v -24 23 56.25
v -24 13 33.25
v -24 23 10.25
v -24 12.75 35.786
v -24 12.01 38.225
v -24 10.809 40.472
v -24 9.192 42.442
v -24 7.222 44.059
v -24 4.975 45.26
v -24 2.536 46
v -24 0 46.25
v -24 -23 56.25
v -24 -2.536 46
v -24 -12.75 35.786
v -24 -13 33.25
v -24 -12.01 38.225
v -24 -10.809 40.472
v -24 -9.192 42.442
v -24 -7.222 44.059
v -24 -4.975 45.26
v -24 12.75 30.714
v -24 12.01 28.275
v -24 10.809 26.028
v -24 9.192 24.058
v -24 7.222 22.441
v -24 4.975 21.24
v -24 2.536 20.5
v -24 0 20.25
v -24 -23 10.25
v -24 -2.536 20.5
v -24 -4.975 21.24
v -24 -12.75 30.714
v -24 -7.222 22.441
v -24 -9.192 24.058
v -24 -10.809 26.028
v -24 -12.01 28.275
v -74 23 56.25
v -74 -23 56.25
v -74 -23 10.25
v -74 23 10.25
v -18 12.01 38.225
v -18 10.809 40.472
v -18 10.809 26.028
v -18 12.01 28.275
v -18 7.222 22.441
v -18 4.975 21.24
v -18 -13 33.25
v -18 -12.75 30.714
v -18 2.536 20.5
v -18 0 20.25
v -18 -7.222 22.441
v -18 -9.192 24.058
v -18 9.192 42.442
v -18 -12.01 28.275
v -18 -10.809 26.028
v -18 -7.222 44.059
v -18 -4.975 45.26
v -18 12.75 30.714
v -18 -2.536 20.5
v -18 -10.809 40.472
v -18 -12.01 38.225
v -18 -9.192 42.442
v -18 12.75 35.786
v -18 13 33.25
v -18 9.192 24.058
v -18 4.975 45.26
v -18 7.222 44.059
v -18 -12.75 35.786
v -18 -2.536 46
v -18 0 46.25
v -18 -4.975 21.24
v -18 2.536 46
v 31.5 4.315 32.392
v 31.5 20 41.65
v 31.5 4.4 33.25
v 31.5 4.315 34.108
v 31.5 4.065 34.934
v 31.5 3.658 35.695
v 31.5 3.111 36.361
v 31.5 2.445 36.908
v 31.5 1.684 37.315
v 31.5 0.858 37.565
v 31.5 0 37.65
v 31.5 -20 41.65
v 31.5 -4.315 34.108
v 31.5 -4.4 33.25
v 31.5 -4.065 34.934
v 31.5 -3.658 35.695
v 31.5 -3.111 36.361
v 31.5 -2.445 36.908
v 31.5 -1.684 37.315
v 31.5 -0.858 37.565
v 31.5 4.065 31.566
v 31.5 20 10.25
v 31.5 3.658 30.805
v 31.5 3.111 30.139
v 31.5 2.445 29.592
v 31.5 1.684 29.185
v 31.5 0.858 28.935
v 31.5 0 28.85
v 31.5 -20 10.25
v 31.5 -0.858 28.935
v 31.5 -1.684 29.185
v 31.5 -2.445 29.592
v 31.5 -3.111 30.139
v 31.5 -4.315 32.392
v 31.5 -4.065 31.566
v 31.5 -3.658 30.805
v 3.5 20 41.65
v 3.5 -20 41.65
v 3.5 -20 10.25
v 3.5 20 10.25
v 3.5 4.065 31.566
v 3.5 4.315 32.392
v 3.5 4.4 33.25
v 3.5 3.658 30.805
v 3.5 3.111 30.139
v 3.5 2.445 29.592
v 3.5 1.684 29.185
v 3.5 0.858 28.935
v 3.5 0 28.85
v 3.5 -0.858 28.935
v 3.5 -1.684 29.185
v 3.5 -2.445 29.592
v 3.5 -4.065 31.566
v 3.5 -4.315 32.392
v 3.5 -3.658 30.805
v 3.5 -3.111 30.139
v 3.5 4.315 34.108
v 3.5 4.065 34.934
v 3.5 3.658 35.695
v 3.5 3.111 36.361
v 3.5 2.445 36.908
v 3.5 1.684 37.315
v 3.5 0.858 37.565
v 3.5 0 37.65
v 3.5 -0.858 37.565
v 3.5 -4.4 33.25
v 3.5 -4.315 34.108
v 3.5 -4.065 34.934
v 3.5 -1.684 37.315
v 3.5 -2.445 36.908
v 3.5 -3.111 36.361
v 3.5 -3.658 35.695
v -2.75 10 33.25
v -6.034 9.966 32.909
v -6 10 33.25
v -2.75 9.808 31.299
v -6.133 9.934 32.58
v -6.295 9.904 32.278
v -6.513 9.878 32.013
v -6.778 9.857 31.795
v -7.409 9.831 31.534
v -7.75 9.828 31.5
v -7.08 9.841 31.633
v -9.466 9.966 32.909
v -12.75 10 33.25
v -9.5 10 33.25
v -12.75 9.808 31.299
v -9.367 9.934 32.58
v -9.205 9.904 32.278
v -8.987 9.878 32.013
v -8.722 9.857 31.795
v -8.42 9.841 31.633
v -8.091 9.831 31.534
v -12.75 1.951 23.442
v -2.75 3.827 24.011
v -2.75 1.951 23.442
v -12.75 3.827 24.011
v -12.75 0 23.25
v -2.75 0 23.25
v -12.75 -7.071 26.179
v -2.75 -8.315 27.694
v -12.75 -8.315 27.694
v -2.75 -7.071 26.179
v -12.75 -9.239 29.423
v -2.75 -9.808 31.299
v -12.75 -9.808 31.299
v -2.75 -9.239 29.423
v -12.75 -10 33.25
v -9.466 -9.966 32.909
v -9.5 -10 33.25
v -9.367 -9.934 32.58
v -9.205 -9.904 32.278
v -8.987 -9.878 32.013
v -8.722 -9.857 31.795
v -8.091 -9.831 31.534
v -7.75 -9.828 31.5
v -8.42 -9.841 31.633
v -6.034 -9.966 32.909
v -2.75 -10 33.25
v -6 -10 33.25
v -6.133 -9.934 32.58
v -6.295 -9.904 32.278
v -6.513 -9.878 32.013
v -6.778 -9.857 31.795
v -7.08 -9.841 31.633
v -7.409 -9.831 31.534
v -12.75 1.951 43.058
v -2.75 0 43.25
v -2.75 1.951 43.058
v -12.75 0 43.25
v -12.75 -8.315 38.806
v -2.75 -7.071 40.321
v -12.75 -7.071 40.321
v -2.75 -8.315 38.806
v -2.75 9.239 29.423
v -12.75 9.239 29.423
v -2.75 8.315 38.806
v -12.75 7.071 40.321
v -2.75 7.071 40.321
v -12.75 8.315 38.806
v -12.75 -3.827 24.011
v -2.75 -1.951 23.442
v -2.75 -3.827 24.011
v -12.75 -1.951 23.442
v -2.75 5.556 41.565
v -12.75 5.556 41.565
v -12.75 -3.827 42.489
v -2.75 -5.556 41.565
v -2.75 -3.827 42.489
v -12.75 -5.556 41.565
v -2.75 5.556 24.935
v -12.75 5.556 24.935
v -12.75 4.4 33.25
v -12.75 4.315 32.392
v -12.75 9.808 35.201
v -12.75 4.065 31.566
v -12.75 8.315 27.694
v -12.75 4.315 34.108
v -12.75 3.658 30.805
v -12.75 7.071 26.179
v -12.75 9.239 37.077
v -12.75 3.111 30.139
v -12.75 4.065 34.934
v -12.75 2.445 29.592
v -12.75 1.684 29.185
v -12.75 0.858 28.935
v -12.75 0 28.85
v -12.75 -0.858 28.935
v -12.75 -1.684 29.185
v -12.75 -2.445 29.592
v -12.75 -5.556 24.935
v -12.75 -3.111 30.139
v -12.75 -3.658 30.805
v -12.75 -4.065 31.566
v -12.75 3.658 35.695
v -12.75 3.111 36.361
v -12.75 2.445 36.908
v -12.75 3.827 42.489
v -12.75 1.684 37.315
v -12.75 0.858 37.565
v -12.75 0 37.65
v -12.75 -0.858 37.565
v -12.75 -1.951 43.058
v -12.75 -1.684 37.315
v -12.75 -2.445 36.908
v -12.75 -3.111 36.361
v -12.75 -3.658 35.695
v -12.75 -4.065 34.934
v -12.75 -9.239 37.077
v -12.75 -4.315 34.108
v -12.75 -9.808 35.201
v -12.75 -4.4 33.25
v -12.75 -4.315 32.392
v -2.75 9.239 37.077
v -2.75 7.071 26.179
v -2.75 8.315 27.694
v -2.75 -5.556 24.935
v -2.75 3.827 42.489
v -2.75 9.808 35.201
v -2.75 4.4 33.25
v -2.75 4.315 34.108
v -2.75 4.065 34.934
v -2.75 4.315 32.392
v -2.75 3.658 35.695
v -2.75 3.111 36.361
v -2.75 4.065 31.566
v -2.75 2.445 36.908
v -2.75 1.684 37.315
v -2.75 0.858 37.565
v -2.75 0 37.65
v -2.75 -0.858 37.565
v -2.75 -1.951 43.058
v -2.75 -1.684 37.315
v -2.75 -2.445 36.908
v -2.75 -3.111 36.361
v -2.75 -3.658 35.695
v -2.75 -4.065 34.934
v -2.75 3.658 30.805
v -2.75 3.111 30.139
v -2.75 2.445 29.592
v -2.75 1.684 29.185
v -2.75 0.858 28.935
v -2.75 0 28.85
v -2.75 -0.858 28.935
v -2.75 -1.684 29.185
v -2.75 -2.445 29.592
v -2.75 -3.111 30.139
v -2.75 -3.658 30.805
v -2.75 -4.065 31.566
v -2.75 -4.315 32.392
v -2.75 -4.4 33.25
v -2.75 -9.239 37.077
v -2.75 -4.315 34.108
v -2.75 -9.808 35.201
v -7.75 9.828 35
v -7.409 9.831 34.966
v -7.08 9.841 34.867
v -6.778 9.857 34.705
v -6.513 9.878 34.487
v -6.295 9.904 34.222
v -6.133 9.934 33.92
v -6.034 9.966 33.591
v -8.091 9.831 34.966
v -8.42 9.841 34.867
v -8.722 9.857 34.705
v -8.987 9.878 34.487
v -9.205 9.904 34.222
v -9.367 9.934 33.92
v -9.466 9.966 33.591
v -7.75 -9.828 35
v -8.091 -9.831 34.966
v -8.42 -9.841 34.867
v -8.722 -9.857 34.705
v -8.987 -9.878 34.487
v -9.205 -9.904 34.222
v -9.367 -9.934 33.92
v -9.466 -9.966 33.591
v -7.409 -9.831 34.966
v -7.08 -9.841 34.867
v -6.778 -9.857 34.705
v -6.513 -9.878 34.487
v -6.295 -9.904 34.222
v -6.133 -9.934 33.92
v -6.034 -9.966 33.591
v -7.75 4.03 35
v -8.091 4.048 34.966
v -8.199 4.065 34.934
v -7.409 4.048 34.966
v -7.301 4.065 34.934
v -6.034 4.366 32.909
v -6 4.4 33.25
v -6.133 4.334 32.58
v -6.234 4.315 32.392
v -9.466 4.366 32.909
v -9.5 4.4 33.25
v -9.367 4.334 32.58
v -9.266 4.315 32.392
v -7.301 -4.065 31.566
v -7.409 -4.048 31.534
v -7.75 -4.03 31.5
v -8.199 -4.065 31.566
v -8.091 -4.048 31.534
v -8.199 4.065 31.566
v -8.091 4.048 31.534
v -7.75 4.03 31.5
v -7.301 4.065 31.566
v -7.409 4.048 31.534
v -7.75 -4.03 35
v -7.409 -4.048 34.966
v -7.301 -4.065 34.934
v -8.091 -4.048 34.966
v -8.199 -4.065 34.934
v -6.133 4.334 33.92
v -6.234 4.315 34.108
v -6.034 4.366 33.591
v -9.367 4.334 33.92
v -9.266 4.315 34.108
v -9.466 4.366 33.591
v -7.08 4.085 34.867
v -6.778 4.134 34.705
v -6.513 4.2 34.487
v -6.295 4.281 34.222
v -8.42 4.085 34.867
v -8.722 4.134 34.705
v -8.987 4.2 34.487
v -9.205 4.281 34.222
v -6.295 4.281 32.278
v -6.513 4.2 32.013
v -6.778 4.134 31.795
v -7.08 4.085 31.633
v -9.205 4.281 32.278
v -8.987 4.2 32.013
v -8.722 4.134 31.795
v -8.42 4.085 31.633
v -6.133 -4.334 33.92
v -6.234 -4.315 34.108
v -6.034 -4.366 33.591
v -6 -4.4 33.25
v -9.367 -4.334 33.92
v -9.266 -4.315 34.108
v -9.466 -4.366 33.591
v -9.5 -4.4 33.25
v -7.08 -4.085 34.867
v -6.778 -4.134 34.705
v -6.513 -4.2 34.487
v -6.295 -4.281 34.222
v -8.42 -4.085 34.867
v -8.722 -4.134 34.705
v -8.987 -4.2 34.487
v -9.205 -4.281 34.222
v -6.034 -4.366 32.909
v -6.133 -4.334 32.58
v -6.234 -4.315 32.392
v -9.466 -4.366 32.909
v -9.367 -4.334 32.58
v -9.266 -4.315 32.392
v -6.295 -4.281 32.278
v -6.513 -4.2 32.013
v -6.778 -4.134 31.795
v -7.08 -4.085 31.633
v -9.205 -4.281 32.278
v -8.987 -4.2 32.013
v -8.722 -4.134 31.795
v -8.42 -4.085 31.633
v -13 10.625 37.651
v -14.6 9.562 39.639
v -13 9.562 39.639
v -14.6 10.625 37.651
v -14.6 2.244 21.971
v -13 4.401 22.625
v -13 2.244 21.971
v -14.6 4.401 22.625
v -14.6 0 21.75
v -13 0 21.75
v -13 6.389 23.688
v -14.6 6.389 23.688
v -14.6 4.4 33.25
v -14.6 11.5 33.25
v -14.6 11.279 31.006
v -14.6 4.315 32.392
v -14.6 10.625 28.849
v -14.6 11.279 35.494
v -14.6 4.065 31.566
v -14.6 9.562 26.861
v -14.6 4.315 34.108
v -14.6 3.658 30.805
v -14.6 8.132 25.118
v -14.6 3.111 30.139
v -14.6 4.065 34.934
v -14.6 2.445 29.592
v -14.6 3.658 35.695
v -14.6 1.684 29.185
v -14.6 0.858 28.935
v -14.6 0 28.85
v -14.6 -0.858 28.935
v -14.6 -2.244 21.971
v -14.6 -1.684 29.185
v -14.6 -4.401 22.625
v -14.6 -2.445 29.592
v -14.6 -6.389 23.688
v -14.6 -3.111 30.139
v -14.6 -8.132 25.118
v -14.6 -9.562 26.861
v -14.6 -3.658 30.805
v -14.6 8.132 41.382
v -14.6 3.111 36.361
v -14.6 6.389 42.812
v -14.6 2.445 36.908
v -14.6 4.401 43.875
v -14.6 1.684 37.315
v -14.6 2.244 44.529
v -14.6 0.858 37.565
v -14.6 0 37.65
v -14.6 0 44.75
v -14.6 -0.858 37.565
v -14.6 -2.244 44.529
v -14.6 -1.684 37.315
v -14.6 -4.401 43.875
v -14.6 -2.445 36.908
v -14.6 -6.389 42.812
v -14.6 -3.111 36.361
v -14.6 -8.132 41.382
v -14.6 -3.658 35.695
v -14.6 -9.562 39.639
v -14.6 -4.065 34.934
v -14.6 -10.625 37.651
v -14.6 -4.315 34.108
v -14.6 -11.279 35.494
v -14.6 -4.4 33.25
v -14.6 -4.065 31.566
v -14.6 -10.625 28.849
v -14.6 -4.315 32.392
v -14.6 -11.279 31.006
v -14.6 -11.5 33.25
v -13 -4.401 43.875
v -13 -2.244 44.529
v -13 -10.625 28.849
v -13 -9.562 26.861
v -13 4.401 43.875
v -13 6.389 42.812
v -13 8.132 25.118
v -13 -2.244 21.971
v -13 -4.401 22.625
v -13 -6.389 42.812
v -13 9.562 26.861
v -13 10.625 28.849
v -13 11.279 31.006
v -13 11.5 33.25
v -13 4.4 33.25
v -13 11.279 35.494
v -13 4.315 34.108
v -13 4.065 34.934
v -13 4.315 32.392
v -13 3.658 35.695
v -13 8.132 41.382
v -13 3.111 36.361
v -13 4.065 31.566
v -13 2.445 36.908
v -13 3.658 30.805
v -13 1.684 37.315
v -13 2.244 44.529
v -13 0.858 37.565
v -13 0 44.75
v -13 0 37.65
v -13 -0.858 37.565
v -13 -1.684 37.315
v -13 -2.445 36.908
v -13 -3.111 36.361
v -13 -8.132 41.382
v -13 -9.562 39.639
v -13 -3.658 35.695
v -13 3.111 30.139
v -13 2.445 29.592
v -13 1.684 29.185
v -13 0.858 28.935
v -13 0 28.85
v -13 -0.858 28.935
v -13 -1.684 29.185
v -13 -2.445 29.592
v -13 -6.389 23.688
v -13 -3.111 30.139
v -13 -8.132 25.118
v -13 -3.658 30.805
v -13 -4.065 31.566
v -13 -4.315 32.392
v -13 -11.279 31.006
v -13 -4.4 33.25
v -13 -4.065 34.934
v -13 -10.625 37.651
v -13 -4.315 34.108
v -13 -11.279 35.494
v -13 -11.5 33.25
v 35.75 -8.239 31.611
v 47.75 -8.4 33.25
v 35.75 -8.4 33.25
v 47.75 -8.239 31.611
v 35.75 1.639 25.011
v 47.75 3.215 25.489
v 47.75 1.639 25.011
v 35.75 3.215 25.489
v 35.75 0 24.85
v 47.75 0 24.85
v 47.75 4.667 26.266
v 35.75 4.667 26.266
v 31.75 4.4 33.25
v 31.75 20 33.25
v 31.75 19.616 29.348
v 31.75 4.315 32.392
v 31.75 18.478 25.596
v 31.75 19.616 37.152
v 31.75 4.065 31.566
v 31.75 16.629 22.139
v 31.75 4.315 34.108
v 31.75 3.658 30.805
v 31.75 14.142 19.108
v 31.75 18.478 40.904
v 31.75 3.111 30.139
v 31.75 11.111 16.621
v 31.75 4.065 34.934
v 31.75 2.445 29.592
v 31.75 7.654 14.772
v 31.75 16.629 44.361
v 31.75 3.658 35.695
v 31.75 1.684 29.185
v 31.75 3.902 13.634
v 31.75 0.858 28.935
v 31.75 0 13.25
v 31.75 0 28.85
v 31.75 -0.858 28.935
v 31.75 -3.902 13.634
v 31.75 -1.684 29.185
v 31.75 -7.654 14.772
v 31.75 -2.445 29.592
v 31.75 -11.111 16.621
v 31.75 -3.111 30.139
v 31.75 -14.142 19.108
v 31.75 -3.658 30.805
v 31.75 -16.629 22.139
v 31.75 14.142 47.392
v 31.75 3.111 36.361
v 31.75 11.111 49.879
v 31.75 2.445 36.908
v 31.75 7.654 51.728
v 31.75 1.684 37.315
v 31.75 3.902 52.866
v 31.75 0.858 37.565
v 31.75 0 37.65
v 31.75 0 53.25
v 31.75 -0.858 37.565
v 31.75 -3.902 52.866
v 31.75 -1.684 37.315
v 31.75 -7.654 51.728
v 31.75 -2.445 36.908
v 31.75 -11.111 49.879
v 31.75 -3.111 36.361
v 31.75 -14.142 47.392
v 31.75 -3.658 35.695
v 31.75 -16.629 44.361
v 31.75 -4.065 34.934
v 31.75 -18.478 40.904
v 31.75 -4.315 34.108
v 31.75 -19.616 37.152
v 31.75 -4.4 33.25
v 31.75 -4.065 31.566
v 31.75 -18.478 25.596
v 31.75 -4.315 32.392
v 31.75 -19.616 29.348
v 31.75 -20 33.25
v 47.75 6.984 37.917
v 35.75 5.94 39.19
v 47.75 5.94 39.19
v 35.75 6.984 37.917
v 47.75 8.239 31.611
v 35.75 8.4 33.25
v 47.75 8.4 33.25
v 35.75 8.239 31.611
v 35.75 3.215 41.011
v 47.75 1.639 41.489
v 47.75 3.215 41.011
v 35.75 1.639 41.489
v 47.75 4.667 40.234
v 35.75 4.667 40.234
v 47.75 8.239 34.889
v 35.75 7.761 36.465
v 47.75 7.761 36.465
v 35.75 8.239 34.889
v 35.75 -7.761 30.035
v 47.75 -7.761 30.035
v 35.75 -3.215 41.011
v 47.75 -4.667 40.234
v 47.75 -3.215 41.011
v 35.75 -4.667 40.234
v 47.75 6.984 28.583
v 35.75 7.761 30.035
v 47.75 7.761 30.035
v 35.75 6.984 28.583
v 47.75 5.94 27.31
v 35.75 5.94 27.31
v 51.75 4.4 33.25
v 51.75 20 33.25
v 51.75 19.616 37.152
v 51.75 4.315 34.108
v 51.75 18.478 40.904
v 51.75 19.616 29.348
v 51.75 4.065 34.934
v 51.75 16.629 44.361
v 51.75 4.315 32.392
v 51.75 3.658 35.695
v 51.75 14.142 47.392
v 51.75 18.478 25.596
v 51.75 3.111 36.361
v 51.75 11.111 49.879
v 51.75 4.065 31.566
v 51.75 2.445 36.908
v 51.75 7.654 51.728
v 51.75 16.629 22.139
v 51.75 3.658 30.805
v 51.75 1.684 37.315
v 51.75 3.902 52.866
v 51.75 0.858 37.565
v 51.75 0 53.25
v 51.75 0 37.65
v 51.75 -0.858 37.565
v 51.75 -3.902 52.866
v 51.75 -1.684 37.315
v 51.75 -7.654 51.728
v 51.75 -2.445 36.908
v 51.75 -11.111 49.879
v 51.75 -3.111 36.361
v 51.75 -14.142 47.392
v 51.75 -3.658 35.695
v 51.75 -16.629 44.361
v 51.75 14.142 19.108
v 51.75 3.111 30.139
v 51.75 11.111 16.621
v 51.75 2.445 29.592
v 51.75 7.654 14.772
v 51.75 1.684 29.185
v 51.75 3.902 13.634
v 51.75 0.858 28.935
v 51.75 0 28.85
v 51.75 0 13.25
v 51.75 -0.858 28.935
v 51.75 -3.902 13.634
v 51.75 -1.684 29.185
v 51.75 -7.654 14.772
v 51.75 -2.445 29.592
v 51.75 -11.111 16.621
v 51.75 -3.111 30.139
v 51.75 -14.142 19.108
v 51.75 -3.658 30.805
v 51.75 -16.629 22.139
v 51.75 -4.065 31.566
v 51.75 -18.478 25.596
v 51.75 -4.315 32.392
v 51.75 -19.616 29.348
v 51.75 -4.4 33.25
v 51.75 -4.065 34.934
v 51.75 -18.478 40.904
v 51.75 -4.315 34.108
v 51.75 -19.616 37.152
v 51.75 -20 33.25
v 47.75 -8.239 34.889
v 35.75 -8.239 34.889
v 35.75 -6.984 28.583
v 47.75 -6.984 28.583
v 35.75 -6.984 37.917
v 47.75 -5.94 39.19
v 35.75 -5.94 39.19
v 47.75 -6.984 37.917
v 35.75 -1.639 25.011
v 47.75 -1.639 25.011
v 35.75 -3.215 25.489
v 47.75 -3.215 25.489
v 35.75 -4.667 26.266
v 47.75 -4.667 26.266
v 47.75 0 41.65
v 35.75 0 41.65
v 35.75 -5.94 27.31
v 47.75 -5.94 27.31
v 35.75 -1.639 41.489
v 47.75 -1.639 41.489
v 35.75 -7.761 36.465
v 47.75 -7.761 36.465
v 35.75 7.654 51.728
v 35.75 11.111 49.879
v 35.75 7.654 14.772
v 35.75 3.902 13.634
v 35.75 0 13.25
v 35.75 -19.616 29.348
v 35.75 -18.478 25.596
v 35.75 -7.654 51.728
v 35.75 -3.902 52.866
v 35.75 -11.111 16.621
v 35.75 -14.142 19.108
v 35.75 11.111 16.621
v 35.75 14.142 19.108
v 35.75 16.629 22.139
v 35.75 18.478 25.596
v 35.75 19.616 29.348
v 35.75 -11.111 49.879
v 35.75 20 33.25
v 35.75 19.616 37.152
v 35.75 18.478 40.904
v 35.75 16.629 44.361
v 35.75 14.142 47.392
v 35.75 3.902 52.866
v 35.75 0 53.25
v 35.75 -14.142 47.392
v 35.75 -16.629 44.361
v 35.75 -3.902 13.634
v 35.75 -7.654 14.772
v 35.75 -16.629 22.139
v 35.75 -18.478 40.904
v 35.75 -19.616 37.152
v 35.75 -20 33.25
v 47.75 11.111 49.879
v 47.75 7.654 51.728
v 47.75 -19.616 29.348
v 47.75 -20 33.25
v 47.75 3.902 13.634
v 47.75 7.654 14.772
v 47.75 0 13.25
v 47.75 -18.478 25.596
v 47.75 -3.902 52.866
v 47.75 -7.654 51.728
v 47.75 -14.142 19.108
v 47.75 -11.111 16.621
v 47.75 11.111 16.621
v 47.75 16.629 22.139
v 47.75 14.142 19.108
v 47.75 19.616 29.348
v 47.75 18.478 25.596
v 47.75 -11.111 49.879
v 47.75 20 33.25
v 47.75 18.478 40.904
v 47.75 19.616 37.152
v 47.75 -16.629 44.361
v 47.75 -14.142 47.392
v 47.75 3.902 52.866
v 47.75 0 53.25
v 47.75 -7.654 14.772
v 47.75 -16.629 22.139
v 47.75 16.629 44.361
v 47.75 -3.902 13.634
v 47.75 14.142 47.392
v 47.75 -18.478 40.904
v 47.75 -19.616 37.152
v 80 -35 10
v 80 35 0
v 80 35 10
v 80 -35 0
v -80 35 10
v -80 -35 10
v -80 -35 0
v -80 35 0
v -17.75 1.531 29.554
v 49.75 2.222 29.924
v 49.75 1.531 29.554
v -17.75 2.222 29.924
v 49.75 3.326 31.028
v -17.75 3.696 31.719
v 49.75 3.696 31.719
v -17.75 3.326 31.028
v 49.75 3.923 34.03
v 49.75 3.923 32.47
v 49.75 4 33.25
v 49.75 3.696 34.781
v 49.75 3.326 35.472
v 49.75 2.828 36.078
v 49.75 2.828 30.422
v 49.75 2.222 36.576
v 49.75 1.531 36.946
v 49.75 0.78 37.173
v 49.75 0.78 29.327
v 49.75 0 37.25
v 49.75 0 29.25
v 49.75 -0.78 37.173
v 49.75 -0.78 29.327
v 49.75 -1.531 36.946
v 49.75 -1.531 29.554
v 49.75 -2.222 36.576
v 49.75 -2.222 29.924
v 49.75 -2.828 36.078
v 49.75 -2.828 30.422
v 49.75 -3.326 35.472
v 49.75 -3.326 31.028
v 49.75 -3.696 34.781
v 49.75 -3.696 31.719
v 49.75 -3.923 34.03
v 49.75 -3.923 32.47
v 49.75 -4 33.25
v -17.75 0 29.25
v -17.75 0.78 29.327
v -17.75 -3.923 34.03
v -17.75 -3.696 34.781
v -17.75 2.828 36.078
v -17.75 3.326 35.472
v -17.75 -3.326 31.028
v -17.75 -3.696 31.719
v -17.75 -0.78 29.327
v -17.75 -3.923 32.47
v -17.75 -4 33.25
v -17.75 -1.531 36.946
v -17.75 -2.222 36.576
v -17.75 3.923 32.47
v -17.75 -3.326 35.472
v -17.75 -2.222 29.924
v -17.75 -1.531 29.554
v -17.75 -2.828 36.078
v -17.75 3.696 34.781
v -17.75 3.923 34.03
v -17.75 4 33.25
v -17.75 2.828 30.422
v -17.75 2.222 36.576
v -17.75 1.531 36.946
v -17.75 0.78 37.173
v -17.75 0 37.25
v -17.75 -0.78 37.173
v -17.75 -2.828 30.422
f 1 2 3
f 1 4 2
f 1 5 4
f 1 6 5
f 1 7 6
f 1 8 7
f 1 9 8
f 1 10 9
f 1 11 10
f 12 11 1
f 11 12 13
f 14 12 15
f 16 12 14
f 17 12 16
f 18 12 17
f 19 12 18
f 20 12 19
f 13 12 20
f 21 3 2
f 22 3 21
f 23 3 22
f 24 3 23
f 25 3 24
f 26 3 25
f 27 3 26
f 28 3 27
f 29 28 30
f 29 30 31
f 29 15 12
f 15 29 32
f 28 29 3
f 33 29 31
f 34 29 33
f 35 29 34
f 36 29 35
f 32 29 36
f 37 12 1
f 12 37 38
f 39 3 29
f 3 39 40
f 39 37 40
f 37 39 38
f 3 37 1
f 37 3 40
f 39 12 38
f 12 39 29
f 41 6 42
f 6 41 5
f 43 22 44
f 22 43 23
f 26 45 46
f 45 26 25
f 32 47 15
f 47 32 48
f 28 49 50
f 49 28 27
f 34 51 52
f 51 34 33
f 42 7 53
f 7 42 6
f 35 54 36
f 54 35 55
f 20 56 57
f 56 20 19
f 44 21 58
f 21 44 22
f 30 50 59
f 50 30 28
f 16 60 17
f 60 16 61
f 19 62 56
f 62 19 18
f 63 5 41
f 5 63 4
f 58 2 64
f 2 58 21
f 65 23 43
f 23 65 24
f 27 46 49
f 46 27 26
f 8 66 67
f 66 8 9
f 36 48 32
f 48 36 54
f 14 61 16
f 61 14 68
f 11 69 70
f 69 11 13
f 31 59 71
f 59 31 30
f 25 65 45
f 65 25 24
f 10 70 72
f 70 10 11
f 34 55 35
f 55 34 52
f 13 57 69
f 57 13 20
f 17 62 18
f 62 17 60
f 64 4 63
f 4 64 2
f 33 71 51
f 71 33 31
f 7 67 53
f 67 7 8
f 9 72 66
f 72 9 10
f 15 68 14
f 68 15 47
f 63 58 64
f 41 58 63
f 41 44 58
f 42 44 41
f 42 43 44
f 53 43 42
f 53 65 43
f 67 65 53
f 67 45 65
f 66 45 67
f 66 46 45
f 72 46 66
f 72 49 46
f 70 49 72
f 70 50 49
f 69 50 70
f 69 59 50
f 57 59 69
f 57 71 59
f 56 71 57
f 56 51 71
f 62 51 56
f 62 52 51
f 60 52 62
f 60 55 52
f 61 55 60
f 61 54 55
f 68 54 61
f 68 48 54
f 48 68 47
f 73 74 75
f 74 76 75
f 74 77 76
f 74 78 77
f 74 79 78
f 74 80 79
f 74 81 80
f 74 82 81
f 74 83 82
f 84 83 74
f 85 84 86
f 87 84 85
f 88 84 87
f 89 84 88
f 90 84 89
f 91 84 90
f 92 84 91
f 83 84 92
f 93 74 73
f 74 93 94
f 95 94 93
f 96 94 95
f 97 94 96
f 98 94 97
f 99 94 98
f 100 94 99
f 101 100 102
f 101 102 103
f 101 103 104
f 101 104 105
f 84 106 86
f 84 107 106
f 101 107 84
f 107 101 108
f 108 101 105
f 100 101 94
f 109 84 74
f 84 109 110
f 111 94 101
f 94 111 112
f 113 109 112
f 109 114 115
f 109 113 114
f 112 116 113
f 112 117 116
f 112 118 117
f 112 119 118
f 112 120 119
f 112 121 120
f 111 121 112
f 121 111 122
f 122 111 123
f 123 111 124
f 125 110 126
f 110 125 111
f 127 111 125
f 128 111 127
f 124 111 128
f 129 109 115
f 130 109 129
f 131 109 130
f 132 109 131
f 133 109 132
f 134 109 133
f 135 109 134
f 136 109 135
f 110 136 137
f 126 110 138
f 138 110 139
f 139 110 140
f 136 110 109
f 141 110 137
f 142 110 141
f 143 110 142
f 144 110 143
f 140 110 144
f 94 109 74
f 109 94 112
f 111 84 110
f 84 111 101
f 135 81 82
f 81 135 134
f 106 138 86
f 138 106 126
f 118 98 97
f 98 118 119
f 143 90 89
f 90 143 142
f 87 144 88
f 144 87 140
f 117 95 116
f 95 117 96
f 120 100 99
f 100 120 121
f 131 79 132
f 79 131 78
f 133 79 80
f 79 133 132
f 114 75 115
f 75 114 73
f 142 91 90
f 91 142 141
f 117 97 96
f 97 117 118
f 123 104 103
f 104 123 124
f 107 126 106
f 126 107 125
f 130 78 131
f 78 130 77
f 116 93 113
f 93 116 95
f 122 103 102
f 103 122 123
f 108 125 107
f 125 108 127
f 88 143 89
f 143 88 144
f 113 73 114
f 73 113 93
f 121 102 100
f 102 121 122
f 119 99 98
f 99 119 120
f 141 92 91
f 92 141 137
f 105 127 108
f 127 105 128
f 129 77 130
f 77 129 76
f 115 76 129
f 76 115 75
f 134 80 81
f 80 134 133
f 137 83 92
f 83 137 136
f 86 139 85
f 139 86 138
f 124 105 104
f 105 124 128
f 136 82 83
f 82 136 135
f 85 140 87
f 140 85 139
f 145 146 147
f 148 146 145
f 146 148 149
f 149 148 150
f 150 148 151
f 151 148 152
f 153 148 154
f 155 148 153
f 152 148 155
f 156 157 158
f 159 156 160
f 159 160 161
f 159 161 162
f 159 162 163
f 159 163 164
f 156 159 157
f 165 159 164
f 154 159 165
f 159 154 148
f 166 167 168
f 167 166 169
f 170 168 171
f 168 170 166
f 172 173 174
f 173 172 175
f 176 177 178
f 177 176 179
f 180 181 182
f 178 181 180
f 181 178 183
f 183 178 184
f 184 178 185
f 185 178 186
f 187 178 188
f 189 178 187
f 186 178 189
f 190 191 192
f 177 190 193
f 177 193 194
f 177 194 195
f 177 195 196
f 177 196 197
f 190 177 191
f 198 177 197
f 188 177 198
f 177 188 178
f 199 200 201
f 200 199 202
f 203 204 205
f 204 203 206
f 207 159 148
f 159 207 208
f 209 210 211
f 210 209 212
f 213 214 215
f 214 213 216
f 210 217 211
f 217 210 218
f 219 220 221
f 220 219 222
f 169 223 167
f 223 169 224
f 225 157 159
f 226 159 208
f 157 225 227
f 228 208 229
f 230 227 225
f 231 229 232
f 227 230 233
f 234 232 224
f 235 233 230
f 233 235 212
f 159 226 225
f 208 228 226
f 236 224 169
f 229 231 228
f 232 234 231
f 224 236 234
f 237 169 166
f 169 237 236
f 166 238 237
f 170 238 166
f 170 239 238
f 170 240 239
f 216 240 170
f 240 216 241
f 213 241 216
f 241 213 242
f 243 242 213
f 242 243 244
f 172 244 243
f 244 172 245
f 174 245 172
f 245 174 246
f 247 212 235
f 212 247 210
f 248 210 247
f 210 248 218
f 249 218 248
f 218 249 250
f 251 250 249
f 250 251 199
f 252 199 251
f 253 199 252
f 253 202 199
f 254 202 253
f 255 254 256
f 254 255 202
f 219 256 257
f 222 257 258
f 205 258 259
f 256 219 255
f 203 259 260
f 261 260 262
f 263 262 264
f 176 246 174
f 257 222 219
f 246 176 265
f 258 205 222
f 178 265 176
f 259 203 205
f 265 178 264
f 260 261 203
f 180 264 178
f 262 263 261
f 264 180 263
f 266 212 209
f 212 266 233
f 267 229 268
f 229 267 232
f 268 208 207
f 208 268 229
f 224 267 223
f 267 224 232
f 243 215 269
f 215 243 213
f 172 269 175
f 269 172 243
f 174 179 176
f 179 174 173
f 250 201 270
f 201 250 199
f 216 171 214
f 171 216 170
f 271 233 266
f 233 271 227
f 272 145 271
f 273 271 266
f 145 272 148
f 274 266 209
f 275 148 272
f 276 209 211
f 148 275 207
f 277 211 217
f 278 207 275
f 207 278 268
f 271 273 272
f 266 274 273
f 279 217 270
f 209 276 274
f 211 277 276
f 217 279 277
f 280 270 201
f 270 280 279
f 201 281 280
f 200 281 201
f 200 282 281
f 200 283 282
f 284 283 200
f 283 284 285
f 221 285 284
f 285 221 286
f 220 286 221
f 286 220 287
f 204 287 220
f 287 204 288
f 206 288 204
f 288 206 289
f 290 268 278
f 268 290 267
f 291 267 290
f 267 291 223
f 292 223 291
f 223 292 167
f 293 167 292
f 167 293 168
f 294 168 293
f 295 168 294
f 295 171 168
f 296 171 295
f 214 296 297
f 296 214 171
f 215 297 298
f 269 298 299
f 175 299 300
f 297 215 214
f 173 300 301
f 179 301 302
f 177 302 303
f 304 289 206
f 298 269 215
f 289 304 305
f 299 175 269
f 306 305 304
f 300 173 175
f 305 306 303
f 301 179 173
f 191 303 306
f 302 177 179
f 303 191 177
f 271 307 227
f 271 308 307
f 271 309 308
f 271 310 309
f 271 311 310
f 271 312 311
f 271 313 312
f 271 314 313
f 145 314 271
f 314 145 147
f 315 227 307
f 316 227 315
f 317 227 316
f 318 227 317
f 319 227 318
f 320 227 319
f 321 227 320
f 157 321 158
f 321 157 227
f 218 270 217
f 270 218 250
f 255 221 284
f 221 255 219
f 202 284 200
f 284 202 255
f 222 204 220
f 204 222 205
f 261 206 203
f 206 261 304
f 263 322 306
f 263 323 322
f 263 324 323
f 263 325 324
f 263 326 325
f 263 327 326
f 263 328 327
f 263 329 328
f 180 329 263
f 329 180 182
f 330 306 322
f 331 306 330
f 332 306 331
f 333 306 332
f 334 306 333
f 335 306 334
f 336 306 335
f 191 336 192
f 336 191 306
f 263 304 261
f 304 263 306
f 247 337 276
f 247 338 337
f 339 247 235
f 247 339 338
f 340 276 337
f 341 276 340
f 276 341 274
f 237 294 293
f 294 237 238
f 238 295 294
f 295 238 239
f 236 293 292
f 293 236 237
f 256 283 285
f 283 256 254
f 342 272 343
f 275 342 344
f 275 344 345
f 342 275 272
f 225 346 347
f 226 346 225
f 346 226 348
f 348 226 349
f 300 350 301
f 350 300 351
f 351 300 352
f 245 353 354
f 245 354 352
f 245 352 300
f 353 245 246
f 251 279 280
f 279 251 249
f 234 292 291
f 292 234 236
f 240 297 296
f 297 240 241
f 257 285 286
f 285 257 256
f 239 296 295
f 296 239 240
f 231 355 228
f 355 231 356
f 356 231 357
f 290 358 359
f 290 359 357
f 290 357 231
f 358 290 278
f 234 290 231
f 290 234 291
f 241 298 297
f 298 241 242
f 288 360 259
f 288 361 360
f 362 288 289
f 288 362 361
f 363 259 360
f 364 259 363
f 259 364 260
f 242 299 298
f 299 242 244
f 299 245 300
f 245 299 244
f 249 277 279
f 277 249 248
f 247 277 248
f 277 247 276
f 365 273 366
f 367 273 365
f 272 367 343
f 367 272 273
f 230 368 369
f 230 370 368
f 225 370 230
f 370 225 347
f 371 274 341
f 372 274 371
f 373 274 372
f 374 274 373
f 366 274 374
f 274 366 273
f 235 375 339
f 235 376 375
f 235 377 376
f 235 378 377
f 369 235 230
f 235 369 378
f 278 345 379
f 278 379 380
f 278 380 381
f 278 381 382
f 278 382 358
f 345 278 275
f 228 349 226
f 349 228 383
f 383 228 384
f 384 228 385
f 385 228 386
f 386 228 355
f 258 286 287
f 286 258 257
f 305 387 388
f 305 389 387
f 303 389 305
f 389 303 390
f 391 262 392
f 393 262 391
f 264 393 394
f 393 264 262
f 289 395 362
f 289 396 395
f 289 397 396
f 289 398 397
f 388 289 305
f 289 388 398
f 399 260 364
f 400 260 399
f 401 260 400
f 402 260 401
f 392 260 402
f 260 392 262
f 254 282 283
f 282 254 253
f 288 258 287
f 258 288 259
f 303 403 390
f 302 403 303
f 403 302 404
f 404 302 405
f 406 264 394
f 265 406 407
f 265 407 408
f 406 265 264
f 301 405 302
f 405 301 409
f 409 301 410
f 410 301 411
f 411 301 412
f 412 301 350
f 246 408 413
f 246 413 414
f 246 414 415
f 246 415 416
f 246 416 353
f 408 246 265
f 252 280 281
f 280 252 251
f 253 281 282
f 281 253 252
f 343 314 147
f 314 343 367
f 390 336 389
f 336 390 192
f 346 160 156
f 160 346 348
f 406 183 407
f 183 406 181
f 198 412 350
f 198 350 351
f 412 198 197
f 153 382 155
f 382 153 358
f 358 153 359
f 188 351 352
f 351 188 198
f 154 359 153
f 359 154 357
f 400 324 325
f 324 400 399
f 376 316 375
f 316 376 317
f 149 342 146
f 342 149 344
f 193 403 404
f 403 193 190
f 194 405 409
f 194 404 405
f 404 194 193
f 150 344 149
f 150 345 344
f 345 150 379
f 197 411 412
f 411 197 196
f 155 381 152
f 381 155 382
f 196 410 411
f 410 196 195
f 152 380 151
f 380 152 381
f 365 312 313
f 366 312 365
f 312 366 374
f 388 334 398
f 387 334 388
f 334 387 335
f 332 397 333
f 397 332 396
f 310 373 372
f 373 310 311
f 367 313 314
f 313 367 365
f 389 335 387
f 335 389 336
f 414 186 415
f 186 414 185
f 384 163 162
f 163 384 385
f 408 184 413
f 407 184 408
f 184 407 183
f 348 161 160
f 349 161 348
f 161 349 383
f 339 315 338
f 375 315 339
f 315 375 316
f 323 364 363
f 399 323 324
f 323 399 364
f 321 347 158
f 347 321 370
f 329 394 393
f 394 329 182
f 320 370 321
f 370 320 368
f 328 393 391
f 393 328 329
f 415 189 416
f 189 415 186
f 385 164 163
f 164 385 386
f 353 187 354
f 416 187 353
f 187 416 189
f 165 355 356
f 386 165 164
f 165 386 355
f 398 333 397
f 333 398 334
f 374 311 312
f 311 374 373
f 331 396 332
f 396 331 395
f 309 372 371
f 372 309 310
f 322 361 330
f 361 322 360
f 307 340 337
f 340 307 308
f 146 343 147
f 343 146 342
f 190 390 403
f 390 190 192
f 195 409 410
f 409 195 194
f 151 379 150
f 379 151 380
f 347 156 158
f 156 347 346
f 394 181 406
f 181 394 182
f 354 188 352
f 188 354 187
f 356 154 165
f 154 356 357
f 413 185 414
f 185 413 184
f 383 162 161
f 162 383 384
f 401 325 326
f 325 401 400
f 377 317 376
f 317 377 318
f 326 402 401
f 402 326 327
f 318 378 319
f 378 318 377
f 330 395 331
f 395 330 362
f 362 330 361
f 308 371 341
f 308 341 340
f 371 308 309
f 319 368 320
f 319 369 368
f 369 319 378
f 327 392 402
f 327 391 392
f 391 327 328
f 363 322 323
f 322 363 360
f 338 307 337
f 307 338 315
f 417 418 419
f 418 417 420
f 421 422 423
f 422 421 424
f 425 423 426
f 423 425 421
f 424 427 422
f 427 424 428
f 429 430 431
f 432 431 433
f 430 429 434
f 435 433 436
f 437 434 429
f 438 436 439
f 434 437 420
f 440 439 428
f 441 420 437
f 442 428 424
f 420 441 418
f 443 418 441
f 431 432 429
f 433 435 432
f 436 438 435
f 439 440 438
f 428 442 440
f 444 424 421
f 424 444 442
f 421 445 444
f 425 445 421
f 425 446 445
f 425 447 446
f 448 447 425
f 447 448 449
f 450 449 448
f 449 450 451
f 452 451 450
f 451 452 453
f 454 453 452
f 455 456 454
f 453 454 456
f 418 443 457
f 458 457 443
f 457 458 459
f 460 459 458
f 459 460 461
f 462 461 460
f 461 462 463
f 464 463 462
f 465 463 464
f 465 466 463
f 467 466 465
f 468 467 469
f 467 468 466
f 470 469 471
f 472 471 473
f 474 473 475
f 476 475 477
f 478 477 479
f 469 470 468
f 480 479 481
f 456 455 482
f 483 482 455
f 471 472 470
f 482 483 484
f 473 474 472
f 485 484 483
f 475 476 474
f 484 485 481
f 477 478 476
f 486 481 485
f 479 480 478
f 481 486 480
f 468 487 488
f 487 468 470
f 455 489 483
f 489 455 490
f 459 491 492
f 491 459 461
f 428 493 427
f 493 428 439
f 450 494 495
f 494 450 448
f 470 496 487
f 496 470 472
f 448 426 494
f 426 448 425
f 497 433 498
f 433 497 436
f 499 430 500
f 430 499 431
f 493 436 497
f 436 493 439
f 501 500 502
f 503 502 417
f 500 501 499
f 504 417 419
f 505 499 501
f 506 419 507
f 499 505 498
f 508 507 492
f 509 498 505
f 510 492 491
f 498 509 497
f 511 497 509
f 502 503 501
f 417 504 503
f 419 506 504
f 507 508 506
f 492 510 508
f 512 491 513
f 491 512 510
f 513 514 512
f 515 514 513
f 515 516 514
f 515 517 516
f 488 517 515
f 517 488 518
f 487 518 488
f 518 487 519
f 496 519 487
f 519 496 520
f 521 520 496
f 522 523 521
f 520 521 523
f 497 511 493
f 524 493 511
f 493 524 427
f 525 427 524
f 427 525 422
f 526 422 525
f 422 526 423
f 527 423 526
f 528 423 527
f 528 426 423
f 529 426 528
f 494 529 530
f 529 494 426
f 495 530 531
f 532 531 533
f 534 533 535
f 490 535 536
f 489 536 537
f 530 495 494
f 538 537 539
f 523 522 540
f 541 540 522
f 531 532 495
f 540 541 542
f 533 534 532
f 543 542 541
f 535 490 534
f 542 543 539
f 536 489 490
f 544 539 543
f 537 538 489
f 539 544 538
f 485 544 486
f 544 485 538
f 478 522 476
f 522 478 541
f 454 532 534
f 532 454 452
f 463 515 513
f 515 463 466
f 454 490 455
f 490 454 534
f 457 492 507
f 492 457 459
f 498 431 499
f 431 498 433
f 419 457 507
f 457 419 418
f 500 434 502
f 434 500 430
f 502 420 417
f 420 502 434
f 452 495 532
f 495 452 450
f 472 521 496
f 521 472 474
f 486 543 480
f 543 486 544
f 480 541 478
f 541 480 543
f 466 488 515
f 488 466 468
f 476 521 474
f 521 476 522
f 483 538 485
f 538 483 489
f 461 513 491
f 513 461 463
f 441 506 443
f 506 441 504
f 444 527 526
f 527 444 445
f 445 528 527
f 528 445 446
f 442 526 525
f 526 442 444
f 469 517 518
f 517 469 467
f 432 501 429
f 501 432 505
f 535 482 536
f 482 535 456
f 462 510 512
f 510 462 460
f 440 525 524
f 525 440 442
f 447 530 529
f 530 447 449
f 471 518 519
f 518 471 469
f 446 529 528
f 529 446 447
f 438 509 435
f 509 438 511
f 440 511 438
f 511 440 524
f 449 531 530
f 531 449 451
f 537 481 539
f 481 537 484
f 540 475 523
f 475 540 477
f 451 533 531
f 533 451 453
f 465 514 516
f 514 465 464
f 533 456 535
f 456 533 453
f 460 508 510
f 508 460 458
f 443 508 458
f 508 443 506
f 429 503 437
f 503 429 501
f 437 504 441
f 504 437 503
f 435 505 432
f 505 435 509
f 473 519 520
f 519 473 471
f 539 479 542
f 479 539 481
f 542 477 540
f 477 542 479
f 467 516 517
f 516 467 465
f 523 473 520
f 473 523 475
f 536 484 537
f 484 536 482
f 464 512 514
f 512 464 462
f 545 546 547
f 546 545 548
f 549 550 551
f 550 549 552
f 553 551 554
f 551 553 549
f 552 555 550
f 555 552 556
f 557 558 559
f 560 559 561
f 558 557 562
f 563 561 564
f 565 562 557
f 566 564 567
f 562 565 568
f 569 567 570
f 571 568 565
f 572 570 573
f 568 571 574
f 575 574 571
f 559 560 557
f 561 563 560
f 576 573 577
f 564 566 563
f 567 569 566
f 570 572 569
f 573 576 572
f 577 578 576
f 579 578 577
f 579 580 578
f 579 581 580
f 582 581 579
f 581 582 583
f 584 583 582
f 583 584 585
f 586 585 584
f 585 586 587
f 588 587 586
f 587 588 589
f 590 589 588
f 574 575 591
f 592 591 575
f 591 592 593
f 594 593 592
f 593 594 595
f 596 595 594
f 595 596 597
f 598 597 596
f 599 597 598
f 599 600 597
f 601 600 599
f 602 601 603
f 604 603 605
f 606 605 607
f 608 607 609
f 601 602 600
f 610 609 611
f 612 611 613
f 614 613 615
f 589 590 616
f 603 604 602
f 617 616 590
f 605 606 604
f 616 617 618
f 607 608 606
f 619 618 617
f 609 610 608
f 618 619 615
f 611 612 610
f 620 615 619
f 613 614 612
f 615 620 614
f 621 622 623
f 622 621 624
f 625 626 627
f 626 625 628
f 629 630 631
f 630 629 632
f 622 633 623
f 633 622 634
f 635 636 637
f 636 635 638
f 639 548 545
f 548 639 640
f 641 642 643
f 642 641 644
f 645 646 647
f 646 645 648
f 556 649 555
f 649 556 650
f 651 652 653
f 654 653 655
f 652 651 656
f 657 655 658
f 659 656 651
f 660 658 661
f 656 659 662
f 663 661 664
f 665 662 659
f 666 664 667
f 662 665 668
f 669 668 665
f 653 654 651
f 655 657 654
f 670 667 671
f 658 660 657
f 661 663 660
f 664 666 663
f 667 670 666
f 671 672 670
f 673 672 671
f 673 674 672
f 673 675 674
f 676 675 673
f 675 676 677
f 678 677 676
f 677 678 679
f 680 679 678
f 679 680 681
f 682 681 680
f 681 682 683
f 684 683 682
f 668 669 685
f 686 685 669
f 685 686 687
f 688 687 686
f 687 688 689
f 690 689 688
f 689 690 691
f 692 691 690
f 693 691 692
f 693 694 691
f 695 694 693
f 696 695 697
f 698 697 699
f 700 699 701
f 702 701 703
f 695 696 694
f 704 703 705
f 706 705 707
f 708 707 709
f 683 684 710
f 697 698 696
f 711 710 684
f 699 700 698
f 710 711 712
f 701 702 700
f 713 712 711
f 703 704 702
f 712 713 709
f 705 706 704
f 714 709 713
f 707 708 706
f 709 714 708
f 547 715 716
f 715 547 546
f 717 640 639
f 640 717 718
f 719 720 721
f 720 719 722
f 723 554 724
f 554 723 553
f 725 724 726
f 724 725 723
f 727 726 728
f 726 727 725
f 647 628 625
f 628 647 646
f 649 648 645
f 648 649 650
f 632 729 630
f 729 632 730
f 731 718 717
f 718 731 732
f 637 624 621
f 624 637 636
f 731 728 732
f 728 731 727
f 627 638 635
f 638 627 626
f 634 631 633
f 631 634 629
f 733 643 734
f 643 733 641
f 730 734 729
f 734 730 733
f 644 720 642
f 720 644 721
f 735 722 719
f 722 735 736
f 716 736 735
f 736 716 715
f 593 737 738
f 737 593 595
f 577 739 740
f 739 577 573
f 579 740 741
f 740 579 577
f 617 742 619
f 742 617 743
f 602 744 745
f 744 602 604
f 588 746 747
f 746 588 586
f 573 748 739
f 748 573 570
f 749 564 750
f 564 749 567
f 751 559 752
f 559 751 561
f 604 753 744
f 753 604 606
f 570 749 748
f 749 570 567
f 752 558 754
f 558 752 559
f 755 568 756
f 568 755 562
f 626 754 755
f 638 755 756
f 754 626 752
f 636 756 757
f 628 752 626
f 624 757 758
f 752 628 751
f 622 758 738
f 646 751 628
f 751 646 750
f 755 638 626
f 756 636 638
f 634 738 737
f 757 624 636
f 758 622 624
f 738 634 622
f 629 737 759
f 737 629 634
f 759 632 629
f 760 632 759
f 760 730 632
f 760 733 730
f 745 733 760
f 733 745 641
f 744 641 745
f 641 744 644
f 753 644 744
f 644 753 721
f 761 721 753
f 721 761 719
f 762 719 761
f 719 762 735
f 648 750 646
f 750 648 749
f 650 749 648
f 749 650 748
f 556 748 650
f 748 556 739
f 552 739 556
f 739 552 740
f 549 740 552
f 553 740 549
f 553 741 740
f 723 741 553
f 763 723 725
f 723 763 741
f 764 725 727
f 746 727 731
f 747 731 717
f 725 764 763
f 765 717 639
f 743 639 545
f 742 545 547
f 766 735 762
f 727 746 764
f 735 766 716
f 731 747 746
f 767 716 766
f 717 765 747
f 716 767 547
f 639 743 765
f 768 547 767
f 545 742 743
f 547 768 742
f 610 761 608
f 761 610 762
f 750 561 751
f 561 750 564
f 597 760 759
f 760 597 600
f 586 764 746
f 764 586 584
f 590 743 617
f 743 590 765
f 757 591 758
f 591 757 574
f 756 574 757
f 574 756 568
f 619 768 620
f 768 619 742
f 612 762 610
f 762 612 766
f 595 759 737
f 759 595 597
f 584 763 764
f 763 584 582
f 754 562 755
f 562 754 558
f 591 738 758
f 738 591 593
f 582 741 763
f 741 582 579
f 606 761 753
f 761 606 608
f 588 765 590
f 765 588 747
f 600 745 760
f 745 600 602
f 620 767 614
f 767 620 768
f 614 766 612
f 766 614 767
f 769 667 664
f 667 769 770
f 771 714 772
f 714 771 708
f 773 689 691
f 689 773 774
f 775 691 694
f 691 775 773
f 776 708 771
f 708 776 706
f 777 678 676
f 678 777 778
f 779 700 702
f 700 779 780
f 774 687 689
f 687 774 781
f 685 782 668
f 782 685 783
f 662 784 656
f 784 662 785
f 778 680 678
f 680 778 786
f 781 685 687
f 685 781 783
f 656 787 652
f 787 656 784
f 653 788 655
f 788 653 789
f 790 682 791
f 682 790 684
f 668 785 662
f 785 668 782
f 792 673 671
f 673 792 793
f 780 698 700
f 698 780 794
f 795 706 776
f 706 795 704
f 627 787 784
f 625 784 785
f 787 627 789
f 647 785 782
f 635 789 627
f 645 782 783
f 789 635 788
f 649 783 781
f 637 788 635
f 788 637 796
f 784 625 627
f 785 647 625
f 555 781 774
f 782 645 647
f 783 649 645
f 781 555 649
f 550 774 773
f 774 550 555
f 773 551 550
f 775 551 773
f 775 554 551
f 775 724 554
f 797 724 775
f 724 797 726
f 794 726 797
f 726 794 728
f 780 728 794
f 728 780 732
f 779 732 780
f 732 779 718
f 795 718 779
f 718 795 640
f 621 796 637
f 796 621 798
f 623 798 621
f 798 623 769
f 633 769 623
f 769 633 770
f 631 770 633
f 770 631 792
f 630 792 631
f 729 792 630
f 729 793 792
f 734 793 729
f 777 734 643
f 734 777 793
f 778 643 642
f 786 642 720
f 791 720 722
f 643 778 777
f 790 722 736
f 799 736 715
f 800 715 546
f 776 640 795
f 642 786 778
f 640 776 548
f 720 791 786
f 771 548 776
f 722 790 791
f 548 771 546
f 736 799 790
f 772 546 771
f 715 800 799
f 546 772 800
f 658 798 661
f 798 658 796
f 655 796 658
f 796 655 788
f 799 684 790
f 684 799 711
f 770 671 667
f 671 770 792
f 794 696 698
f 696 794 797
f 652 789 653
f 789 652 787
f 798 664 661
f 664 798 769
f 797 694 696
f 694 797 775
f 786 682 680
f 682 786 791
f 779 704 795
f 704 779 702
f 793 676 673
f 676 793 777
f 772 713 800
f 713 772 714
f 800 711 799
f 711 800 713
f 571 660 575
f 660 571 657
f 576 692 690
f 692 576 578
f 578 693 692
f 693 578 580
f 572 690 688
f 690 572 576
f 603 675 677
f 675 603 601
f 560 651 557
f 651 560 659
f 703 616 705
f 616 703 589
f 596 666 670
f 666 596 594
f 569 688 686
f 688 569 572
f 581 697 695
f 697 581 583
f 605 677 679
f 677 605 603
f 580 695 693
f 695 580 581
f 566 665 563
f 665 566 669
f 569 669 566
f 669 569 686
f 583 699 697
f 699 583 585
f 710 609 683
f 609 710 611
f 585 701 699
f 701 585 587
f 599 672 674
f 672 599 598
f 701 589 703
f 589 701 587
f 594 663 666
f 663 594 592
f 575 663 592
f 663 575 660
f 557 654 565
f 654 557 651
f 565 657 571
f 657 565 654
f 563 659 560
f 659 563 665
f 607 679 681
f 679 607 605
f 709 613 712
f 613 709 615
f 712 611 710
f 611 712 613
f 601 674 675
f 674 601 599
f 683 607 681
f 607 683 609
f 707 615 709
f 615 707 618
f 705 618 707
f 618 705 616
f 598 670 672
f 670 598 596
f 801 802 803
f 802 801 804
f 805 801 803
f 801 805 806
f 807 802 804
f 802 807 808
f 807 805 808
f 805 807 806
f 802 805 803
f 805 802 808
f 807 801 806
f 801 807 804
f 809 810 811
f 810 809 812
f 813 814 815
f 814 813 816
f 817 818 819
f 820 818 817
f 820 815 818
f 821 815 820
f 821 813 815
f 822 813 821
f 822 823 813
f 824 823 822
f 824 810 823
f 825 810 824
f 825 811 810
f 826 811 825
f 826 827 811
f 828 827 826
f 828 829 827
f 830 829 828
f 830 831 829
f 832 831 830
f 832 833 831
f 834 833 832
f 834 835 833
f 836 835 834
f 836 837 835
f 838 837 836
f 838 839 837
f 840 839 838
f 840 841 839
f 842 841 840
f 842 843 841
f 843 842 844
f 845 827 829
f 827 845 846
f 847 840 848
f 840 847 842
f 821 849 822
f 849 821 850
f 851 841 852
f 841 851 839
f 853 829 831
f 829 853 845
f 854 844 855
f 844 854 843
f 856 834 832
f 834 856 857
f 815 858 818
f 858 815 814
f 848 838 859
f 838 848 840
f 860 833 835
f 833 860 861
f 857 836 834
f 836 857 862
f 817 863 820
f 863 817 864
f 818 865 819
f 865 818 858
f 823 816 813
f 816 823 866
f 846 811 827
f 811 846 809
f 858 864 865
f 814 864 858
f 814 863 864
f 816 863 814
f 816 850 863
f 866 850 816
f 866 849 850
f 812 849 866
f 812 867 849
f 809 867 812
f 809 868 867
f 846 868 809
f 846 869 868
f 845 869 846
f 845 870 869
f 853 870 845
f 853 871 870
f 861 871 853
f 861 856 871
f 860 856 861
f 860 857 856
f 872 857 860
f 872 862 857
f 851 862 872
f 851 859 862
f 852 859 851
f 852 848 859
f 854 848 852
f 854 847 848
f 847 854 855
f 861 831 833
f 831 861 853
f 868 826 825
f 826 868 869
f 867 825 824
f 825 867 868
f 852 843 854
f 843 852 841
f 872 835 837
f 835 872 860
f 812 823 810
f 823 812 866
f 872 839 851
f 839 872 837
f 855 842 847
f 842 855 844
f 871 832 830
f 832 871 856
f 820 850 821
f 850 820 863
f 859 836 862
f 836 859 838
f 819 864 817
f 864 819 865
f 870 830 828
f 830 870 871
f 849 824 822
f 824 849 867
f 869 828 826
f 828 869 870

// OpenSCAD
$fn = 32;

// ------------------------------------------------------------------------
// Motor drive station: motor 50 x 46 mm, shaft d8, pulley d40
// Every part is its own module, assembly() places every instance.
// ------------------------------------------------------------------------

// --- part 1 ---
module station_bed() {
  difference() {
    translate([-80, -35, 0]) cube([160, 70, 10]);
  }
}

// --- part 2 ---
module drive_motor() {
  union() {
    translate([-25, -23, 0]) cube([50, 46, 46]);
    translate([28, 0, 23]) rotate([0, 90, 0]) cylinder(h = 6, d = 26, center = true);
  }
}

// --- part 3 ---
module pillow_block() {
  difference() {
    translate([-14, -20, 0]) cube([28, 40, 31.4]);
    translate([0, 0, 23]) rotate([0, 90, 0]) cylinder(h = 30, d = 8.8, center = true);
  }
}

// --- part 4 ---
module drive_shaft() {
  translate([0, 0, -33.75]) cylinder(h = 67.5, d = 8);
}

// --- part 5 ---
module shaft_collar() {
  difference() {
    cylinder(h = 10, d = 20);
    translate([0, 0, -1]) cylinder(h = 12, d = 8.8);
    translate([0, 0, 5]) rotate([90, 0, 0]) cylinder(h = 22, d = 3.5, center = true);
  }
}

// --- part 6 ---
module collar_washer() {
  difference() {
      translate([0, 0, 0]) cylinder(h = 1.6, d = 23);
      translate([0, 0, -1]) cylinder(h = 3.6, d = 8.8);
    }
}

// --- part 7 ---
module drive_pulley() {
  difference() {
    union() {
      cylinder(h = 20, d = 16.8);
      cylinder(h = 4, d = 40);
      translate([0, 0, 16]) cylinder(h = 4, d = 40);
    }
    translate([0, 0, -1]) cylinder(h = 22, d = 8.8);
  }
}

// --- assembly ---
module assembly() {
  color([0.80, 0.24, 0.20]) translate([0, 0, 0]) rotate([0, 0, 0]) station_bed();
  color([0.20, 0.45, 0.75]) translate([-49, 0, 10.25]) rotate([0, 0, 0]) drive_motor();
  color([0.25, 0.62, 0.32]) translate([17.5, 0, 10.25]) rotate([0, 0, 0]) pillow_block();
  color([0.92, 0.70, 0.18]) translate([16, 0, 33.25]) rotate([0, 90, 0]) drive_shaft();
  color([0.58, 0.35, 0.70]) translate([-12.75, 0, 33.25]) rotate([0, 90, 0]) shaft_collar();
  color([0.16, 0.66, 0.66]) translate([-14.6, 0, 33.25]) rotate([0, 90, 0]) collar_washer();
  color([0.85, 0.48, 0.18]) translate([31.75, 0, 33.25]) rotate([0, 90, 0]) drive_pulley();
}

assembly();
